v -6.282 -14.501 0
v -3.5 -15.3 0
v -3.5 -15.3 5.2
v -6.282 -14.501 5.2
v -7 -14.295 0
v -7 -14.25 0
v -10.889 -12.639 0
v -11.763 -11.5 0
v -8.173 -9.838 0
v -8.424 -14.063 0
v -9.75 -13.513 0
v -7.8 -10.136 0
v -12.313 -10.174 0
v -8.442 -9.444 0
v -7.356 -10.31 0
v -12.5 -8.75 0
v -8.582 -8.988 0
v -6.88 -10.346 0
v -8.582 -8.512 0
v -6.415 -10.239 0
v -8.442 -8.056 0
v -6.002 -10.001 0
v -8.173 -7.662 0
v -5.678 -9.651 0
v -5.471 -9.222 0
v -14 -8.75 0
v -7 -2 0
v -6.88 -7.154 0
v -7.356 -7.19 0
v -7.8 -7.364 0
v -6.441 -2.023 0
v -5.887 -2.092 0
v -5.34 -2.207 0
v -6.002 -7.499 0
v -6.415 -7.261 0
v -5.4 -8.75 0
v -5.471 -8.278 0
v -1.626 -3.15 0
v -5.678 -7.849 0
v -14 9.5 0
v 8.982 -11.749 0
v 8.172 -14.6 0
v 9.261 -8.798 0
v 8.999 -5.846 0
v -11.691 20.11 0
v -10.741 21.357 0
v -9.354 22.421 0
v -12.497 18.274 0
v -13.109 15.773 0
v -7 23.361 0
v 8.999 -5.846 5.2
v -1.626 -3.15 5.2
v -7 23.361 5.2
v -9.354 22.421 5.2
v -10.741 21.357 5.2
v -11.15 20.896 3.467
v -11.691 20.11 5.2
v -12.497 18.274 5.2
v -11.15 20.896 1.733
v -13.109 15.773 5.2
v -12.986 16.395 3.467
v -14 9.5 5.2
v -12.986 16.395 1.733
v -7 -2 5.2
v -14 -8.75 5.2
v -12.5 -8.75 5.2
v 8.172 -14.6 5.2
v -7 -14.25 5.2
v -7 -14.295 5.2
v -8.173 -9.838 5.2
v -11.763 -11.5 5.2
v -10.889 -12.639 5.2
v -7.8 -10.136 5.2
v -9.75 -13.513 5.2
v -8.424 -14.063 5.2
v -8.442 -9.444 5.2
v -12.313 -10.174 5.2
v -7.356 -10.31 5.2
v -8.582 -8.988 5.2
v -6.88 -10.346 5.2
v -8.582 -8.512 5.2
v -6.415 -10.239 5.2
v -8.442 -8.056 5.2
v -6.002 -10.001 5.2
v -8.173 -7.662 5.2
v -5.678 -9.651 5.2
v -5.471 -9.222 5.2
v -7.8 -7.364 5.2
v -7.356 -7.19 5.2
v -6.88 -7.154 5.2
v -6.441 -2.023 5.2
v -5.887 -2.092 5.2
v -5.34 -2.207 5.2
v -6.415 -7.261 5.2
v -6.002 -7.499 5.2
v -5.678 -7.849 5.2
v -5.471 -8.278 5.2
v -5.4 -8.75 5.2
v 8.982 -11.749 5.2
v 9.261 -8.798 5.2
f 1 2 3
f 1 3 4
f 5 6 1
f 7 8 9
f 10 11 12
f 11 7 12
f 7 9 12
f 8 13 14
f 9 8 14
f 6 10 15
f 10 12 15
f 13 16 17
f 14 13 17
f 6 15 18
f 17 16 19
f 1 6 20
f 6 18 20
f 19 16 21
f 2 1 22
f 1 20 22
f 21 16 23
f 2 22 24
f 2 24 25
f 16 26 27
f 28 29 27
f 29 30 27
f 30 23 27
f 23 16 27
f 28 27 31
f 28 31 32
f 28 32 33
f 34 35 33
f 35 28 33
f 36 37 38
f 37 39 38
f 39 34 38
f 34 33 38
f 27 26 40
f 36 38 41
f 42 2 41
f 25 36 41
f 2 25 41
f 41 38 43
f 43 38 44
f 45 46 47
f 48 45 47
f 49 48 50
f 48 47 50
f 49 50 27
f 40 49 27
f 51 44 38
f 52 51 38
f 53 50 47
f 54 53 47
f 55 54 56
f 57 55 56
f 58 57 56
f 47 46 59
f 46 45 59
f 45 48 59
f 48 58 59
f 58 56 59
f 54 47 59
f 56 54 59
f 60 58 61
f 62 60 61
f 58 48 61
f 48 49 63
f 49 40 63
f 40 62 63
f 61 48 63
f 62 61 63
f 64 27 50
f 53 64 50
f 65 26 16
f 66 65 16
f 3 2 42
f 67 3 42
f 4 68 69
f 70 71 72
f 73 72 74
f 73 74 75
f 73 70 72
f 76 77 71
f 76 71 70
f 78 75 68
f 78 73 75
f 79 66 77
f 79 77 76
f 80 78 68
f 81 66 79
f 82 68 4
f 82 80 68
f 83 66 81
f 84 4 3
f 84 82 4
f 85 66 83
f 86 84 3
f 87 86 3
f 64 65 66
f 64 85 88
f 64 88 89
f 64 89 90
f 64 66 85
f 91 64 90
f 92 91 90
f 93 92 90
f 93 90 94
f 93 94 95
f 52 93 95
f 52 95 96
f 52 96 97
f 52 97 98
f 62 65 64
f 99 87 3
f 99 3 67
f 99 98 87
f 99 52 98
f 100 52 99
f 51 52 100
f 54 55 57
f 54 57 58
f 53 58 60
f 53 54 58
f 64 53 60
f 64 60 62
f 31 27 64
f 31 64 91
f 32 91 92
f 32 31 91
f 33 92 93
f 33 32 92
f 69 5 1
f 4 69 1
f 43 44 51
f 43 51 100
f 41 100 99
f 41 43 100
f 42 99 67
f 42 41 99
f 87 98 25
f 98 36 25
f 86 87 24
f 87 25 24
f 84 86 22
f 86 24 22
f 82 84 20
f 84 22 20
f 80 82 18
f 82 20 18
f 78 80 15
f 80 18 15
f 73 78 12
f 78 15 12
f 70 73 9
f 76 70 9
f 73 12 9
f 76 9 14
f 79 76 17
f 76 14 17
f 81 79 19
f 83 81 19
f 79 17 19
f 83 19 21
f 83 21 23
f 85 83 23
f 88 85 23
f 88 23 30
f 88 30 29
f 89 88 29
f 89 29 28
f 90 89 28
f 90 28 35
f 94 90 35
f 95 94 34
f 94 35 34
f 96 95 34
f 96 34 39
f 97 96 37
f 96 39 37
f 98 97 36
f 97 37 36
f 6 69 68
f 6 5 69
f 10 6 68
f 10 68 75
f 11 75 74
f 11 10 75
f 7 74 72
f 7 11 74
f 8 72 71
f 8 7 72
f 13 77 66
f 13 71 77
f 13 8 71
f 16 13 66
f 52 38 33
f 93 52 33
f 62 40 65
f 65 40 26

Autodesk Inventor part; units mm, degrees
ref_plane "YZ Plane" through (0, 0, 0) normal (1, 0, 0) x (0, 1, 0)
ref_plane "XZ Plane" through (0, 0, 0) normal (0, 1, 0) x (-1, 0, 0)
ref_plane "XY Plane" through (0, 0, 0) normal (0, 0, 1) x (1, 0, 0)
sketch "Эскиз1" plane through (0, 0, 0) normal (0, 0, 1) x (1, 0, 0)
  circle A0 centre (-7, -17) radius 1.5 projected
  line L0 (14, -14.4) -> (14, -5) projected
  arc A1 (14, -5) -> (11, -2) centre (11, -5) ccw projected
  line L1 (11, -2) -> (-7, -2) projected
  line L2 (-7, -2) -> (-7, 15) projected
  line L3 (-14, 9.5) -> (-14, -8.75) projected
  line L4 (-7, -24) -> (7, -24) projected
  arc A2 (7, -24) -> (13.4992, -14.4) centre (7, -17) ccw projected
  line L5 (13.4992, -14.4) -> (14, -14.4) projected
  circle A3 centre (7, -17) radius 2.5 projected
  circle A4 centre (-7, -8.75) radius 5.5 projected
  circle A5 centre (-7, -8.75) radius 6.75 projected
  circle A6 centre (-7, -8.75) radius 5.5 projected
  circle A7 centre (-7, -8.75) radius 16.2607 projected
  circle A8 centre (-7, -8.75) radius 6.75 projected
  circle A9 centre (-7, -8.75) radius 5.5 projected
  arc A10 (46.8183, -61.5099) -> (48.485, -59.5378) centre (46.485, -59.5378) ccw projected
  line L6 (48.485, -59.5378) -> (48.485, -18) projected
  arc A11 (51.485, -15) -> (48.485, -18) centre (51.485, -18) ccw projected
  line L7 (51.485, -15) -> (51.97, -15) projected
  arc A12 (51.97, -15) -> (54.97, -12) centre (51.97, -12) ccw projected
  line L8 (54.97, -5) -> (54.97, -12) projected
  arc A13 (54.97, -5) -> (51.97, -2) centre (51.97, -5) ccw projected
  line L9 (-0.3729, -2) -> (51.97, -2) projected
  arc A14 (-0.3729, -2) -> (-11.03, -11.2398) centre (-0.1714, -12.9982) ccw projected
  line L10 (-11.03, -11.2398) -> (-11.03, -20.501) projected
  arc A15 (-11.03, -20.501) -> (-9.8871, -23.3004) centre (-7.03, -20.501) ccw projected
  arc A16 (-9.03, -25.4) -> (-9.8871, -23.3004) centre (-12.03, -25.4) ccw projected
  line L11 (-9.03, -25.4) -> (-9.03, -104.6) projected
  arc A17 (-9.8871, -106.6996) -> (-9.03, -104.6) centre (-12.03, -104.6) ccw projected
  arc A18 (-9.8871, -106.6996) -> (-11.03, -109.499) centre (-7.03, -109.499) ccw projected
  line L12 (-11.03, -109.499) -> (-11.03, -118.7602) projected
  arc A19 (-11.03, -118.7602) -> (-0.3729, -128) centre (-0.1714, -117.0018) ccw projected
  line L13 (51.97, -128) -> (-0.3729, -128) projected
  arc A20 (51.97, -128) -> (54.97, -125) centre (51.97, -125) ccw projected
  line L14 (54.97, -118) -> (54.97, -125) projected
  arc A21 (54.97, -118) -> (51.97, -115) centre (51.97, -118) ccw projected
  line L15 (51.97, -115) -> (51.485, -115) projected
  arc A22 (48.485, -112) -> (51.485, -115) centre (51.485, -112) ccw projected
  line L16 (48.485, -112) -> (48.485, -80.5022) projected
  arc A23 (48.485, -80.5022) -> (46.8183, -78.5301) centre (46.485, -80.5022) ccw projected
  arc A24 (43.485, -77.3303) -> (46.8183, -78.5301) centre (48.485, -68.67) ccw projected
  arc A25 (42.485, -75.5982) -> (43.485, -77.3303) centre (44.485, -75.5982) ccw projected
  line L17 (42.485, -75.5982) -> (42.485, -64.4418) projected
  arc A26 (43.485, -62.7097) -> (42.485, -64.4418) centre (44.485, -64.4418) ccw projected
  arc A27 (46.8183, -61.5099) -> (43.485, -62.7097) centre (48.485, -71.37) ccw projected
  circle A28 centre (-7, -113) radius 1.5 projected
  circle A29 centre (-7, -17) radius 1.5 projected
  circle A30 centre (48.485, -121.515) radius 1.5 projected
  circle A31 centre (7, -83) radius 1.5 projected
  circle A32 centre (7, -47) radius 1.5 projected
  circle A33 centre (48.485, -8.485) radius 1.5 projected
  circle A34 centre (39.485, -9.27) radius 0.325 projected
  circle A35 centre (38.885, -57.77) radius 0.8 projected
  circle A36 centre (39.385, -64.52) radius 0.5 projected
  circle A37 centre (-5.73, -68.27) radius 0.325 projected
  circle A38 centre (18.2, -105.38) radius 0.325 projected
  circle A39 centre (2.77, -17) radius 0.325 projected
  circle A40 centre (45.185, -81.79) radius 0.325 projected
  circle A41 centre (45.185, -36.51) radius 0.325 projected
  circle A42 centre (2.77, -10) radius 0.325 projected
  circle A43 centre (2.77, -120) radius 0.325 projected
  circle A44 centre (-5.73, -55.42) radius 0.325 projected
  circle A45 centre (29.385, -72.52) radius 0.85 projected
  circle A46 centre (43.885, -57.77) radius 0.8 projected
  circle A47 centre (-1.23, -120) radius 0.325 projected
  circle A48 centre (29.385, -67.52) radius 0.85 projected
  circle A49 centre (18.2, -92.76) radius 0.325 projected
  circle A50 centre (-5.73, -79) radius 0.325 projected
  circle A51 centre (35.215, -122) radius 0.325 projected
  circle A52 centre (33.485, -7.27) radius 0.5 projected
  circle A53 centre (45.185, -101.03) radius 0.325 projected
  circle A54 centre (45.185, -16.27) radius 0.325 projected
  circle A55 centre (35.215, -115) radius 0.325 projected
  circle A56 centre (2.77, -113) radius 0.325 projected
  circle A57 centre (-5.73, -40.84) radius 0.325 projected
  circle A58 centre (39.385, -75.52) radius 0.5 projected
  circle A59 centre (-1.23, -10) radius 0.325 projected
  arc A60 (46.8183, -61.5099) -> (48.485, -59.5378) centre (46.485, -59.5378) ccw projected
  line L18 (48.485, -59.5378) -> (48.485, -18) projected
  arc A61 (51.485, -15) -> (48.485, -18) centre (51.485, -18) ccw projected
  line L19 (51.485, -15) -> (51.97, -15) projected
  arc A62 (51.97, -15) -> (54.97, -12) centre (51.97, -12) ccw projected
  line L20 (54.97, -5) -> (54.97, -12) projected
  arc A63 (54.97, -5) -> (51.97, -2) centre (51.97, -5) ccw projected
  line L21 (-0.3729, -2) -> (51.97, -2) projected
  arc A64 (-0.3729, -2) -> (-11.03, -11.2398) centre (-0.1714, -12.9982) ccw projected
  line L22 (-11.03, -11.2398) -> (-11.03, -20.501) projected
  arc A65 (-11.03, -20.501) -> (-9.8871, -23.3004) centre (-7.03, -20.501) ccw projected
  arc A66 (-9.03, -25.4) -> (-9.8871, -23.3004) centre (-12.03, -25.4) ccw projected
  line L23 (-9.03, -25.4) -> (-9.03, -104.6) projected
  arc A67 (-9.8871, -106.6996) -> (-9.03, -104.6) centre (-12.03, -104.6) ccw projected
  arc A68 (-9.8871, -106.6996) -> (-11.03, -109.499) centre (-7.03, -109.499) ccw projected
  line L24 (-11.03, -109.499) -> (-11.03, -118.7602) projected
  arc A69 (-11.03, -118.7602) -> (-0.3729, -128) centre (-0.1714, -117.0018) ccw projected
  line L25 (51.97, -128) -> (-0.3729, -128) projected
  arc A70 (51.97, -128) -> (54.97, -125) centre (51.97, -125) ccw projected
  line L26 (54.97, -118) -> (54.97, -125) projected
  arc A71 (54.97, -118) -> (51.97, -115) centre (51.97, -118) ccw projected
  line L27 (51.97, -115) -> (51.485, -115) projected
  arc A72 (48.485, -112) -> (51.485, -115) centre (51.485, -112) ccw projected
  line L28 (48.485, -112) -> (48.485, -80.5022) projected
  arc A73 (48.485, -80.5022) -> (46.8183, -78.5301) centre (46.485, -80.5022) ccw projected
  arc A74 (43.485, -77.3303) -> (46.8183, -78.5301) centre (48.485, -68.67) ccw projected
  arc A75 (42.485, -75.5982) -> (43.485, -77.3303) centre (44.485, -75.5982) ccw projected
  line L29 (42.485, -75.5982) -> (42.485, -64.4418) projected
  arc A76 (43.485, -62.7097) -> (42.485, -64.4418) centre (44.485, -64.4418) ccw projected
  arc A77 (46.8183, -61.5099) -> (43.485, -62.7097) centre (48.485, -71.37) ccw projected
  circle A78 centre (-7, -113) radius 1.5 projected
  circle A79 centre (-7, -17) radius 1.5 projected
  circle A80 centre (48.485, -121.515) radius 1.5 projected
  circle A81 centre (7, -83) radius 1.5 projected
  circle A82 centre (7, -47) radius 1.5 projected
  circle A83 centre (48.485, -8.485) radius 1.5 projected
  circle A84 centre (39.485, -9.27) radius 0.325 projected
  circle A85 centre (38.885, -57.77) radius 0.8 projected
  circle A86 centre (39.385, -64.52) radius 0.5 projected
  circle A87 centre (-5.73, -68.27) radius 0.325 projected
  circle A88 centre (18.2, -105.38) radius 0.325 projected
  circle A89 centre (2.77, -17) radius 0.325 projected
  circle A90 centre (45.185, -81.79) radius 0.325 projected
  circle A91 centre (45.185, -36.51) radius 0.325 projected
  circle A92 centre (2.77, -10) radius 0.325 projected
  circle A93 centre (2.77, -120) radius 0.325 projected
  circle A94 centre (-5.73, -55.42) radius 0.325 projected
  circle A95 centre (29.385, -72.52) radius 0.85 projected
  circle A96 centre (43.885, -57.77) radius 0.8 projected
  circle A97 centre (-1.23, -120) radius 0.325 projected
  circle A98 centre (29.385, -67.52) radius 0.85 projected
  circle A99 centre (18.2, -92.76) radius 0.325 projected
  circle A100 centre (-5.73, -79) radius 0.325 projected
  circle A101 centre (35.215, -122) radius 0.325 projected
  circle A102 centre (33.485, -7.27) radius 0.5 projected
  circle A103 centre (45.185, -101.03) radius 0.325 projected
  circle A104 centre (45.185, -16.27) radius 0.325 projected
  circle A105 centre (35.215, -115) radius 0.325 projected
  circle A106 centre (2.77, -113) radius 0.325 projected
  circle A107 centre (-5.73, -40.84) radius 0.325 projected
  circle A108 centre (39.385, -75.52) radius 0.5 projected
  circle A109 centre (-1.23, -10) radius 0.325 projected
  circle A110 centre (-7, -17) radius 1.5 projected
  circle A111 centre (7, -17) radius 2.5 projected
  circle A112 centre (-7, -8.75) radius 16.2607 projected
  arc A113 (46.8183, -61.5099) -> (48.485, -59.5378) centre (46.485, -59.5378) ccw projected
  line L30 (48.485, -59.5378) -> (48.485, -18) projected
  arc A114 (51.485, -15) -> (48.485, -18) centre (51.485, -18) ccw projected
  line L31 (51.485, -15) -> (51.97, -15) projected
  arc A115 (51.97, -15) -> (54.97, -12) centre (51.97, -12) ccw projected
  line L32 (54.97, -5) -> (54.97, -12) projected
  arc A116 (54.97, -5) -> (51.97, -2) centre (51.97, -5) ccw projected
  line L33 (-0.3729, -2) -> (51.97, -2) projected
  arc A117 (-0.3729, -2) -> (-11.03, -11.2398) centre (-0.1714, -12.9982) ccw projected
  line L34 (-11.03, -11.2398) -> (-11.03, -20.501) projected
  arc A118 (-11.03, -20.501) -> (-9.8871, -23.3004) centre (-7.03, -20.501) ccw projected
  arc A119 (-9.03, -25.4) -> (-9.8871, -23.3004) centre (-12.03, -25.4) ccw projected
  line L35 (-9.03, -25.4) -> (-9.03, -104.6) projected
  arc A120 (-9.8871, -106.6996) -> (-9.03, -104.6) centre (-12.03, -104.6) ccw projected
  arc A121 (-9.8871, -106.6996) -> (-11.03, -109.499) centre (-7.03, -109.499) ccw projected
  line L36 (-11.03, -109.499) -> (-11.03, -118.7602) projected
  arc A122 (-11.03, -118.7602) -> (-0.3729, -128) centre (-0.1714, -117.0018) ccw projected
  line L37 (51.97, -128) -> (-0.3729, -128) projected
  arc A123 (51.97, -128) -> (54.97, -125) centre (51.97, -125) ccw projected
  line L38 (54.97, -118) -> (54.97, -125) projected
  arc A124 (54.97, -118) -> (51.97, -115) centre (51.97, -118) ccw projected
  line L39 (51.97, -115) -> (51.485, -115) projected
  arc A125 (48.485, -112) -> (51.485, -115) centre (51.485, -112) ccw projected
  line L40 (48.485, -112) -> (48.485, -80.5022) projected
  arc A126 (48.485, -80.5022) -> (46.8183, -78.5301) centre (46.485, -80.5022) ccw projected
  arc A127 (43.485, -77.3303) -> (46.8183, -78.5301) centre (48.485, -68.67) ccw projected
  arc A128 (42.485, -75.5982) -> (43.485, -77.3303) centre (44.485, -75.5982) ccw projected
  line L41 (42.485, -75.5982) -> (42.485, -64.4418) projected
  arc A129 (43.485, -62.7097) -> (42.485, -64.4418) centre (44.485, -64.4418) ccw projected
  arc A130 (46.8183, -61.5099) -> (43.485, -62.7097) centre (48.485, -71.37) ccw projected
  circle A131 centre (-7, -113) radius 1.5 projected
  circle A132 centre (-7, -17) radius 1.5 projected
  circle A133 centre (48.485, -121.515) radius 1.5 projected
  circle A134 centre (7, -83) radius 1.5 projected
  circle A135 centre (7, -47) radius 1.5 projected
  circle A136 centre (48.485, -8.485) radius 1.5 projected
  circle A137 centre (39.485, -9.27) radius 0.325 projected
  circle A138 centre (38.885, -57.77) radius 0.8 projected
  circle A139 centre (39.385, -64.52) radius 0.5 projected
  circle A140 centre (-5.73, -68.27) radius 0.325 projected
  circle A141 centre (18.2, -105.38) radius 0.325 projected
  circle A142 centre (2.77, -17) radius 0.325 projected
  circle A143 centre (45.185, -81.79) radius 0.325 projected
  circle A144 centre (45.185, -36.51) radius 0.325 projected
  circle A145 centre (2.77, -10) radius 0.325 projected
  circle A146 centre (2.77, -120) radius 0.325 projected
  circle A147 centre (-5.73, -55.42) radius 0.325 projected
  circle A148 centre (29.385, -72.52) radius 0.85 projected
  circle A149 centre (43.885, -57.77) radius 0.8 projected
  circle A150 centre (-1.23, -120) radius 0.325 projected
  circle A151 centre (29.385, -67.52) radius 0.85 projected
  circle A152 centre (18.2, -92.76) radius 0.325 projected
  circle A153 centre (-5.73, -79) radius 0.325 projected
  circle A154 centre (35.215, -122) radius 0.325 projected
  circle A155 centre (33.485, -7.27) radius 0.5 projected
  circle A156 centre (45.185, -101.03) radius 0.325 projected
  circle A157 centre (45.185, -16.27) radius 0.325 projected
  circle A158 centre (35.215, -115) radius 0.325 projected
  circle A159 centre (2.77, -113) radius 0.325 projected
  circle A160 centre (-5.73, -40.84) radius 0.325 projected
  circle A161 centre (39.385, -75.52) radius 0.5 projected
  circle A162 centre (-1.23, -10) radius 0.325 projected
  line L42 (-3.5, -15.3) -> (8.172, -14.6) projected
  line L43 (-1.9964, -14.2379) -> (9.1448, -10.6884) projected
  line L44 (7.4875, -11.5) -> (-3.5, -15.5) projected
  line L45 (-3.5, -15.3) -> (8.172, -14.6) projected
  line L46 (8.172, -14.8) -> (-3.5, -15.5) projected
  arc A163 (8.1929, -15.5) -> (7.4875, -11.5) centre (-3.5, -15.5) ccw projected
  line L47 (-3.5, -15.5) -> (9.3, -15.5) projected
  line L48 (-3.5, -15.5) -> (9.3, -15.5) projected
  circle A164 centre (-7, -17) radius 1.5 projected
  line L49 (14, -14.4) -> (14, -5) projected
  arc A165 (14, -5) -> (11, -2) centre (11, -5) ccw projected
  line L50 (11, -2) -> (-7, -2) projected
  line L51 (-7, -2) -> (-7, 15) projected
  line L52 (-14, 9.5) -> (-14, -8.75) projected
  line L53 (-7, -24) -> (7, -24) projected
  arc A166 (7, -24) -> (13.4992, -14.4) centre (7, -17) ccw projected
  line L54 (13.4992, -14.4) -> (14, -14.4) projected
  circle A167 centre (7, -17) radius 2.5 projected
  circle A168 centre (-7, -17) radius 1.5 projected
  line L55 (14, -14.4) -> (14, -5) projected
  arc A169 (14, -5) -> (11, -2) centre (11, -5) ccw projected
  line L56 (11, -2) -> (-7, -2) projected
  line L57 (-7, -2) -> (-7, 15) projected
  line L58 (-14, 9.5) -> (-14, -8.75) projected
  line L59 (-7, -24) -> (7, -24) projected
  arc A170 (7, -24) -> (13.4992, -14.4) centre (7, -17) ccw projected
  line L60 (13.4992, -14.4) -> (14, -14.4) projected
  circle A171 centre (7, -17) radius 2.5 projected
  line L61 (-3.5, -25.6) -> (-3.5, -15.5) projected
  line L62 (-3.5, -25.6) -> (-3.5, -15.5) projected
  line L63 (-3.5, -15.3) -> (-6.2824, -14.501) projected
  circle A172 centre (-7, -17) radius 2.6 projected
  line L64 (-3.5, -15.5) -> (-7, -15.5) projected
  circle A173 centre (-7, -17) radius 1.5 projected
  line L65 (14, -14.4) -> (14, -5) projected
  arc A174 (14, -5) -> (11, -2) centre (11, -5) ccw projected
  line L66 (11, -2) -> (-7, -2) projected
  line L67 (-7, -2) -> (-7, 15) projected
  line L68 (-14, 9.5) -> (-14, -8.75) projected
  line L69 (-7, -24) -> (7, -24) projected
  arc A175 (7, -24) -> (13.4992, -14.4) centre (7, -17) ccw projected
  line L70 (13.4992, -14.4) -> (14, -14.4) projected
  circle A176 centre (7, -17) radius 2.5 projected
  circle A177 centre (-7, -17) radius 1.5 projected
  circle A178 centre (-7, -17) radius 2.6 projected
  circle A179 centre (-7, -8.75) radius 5.5 projected
  line L71 (-1.9964, -14.2379) -> (-4.8898, -14.1478) projected
  line L72 (-1.9964, -14.2379) -> (9.1448, -10.6884) projected
  line L73 (-1.9964, -14.2379) -> (9.1448, -10.6884) projected
  circle A180 centre (-7, -8.75) radius 6.75 projected
  line L74 (-5.8077, -14.1192) -> (-4.8898, -14.1478) projected
  line L75 (-5.8077, -14.1192) -> (-4.8898, -14.1478) projected
  circle A181 centre (-7, -8.75) radius 5.5 projected
  line L76 (-7, -15.5) -> (-7, -2) projected
  line L77 (-7.1651, -14.2475) -> (-6.2824, -14.501) projected
  line L78 (-3.5, -15.3) -> (-6.2824, -14.501) projected
  circle A182 centre (-7, -17) radius 1.5 projected
  line L79 (14, -14.4) -> (14, -5) projected
  arc A183 (14, -5) -> (11, -2) centre (11, -5) ccw projected
  line L80 (11, -2) -> (-7, -2) projected
  line L81 (-7, -2) -> (-7, 15) projected
  line L82 (-14, 9.5) -> (-14, -8.75) projected
  line L83 (-7, -24) -> (7, -24) projected
  arc A184 (7, -24) -> (13.4992, -14.4) centre (7, -17) ccw projected
  line L84 (13.4992, -14.4) -> (14, -14.4) projected
  circle A185 centre (7, -17) radius 2.5 projected
  circle A186 centre (-7, -17) radius 2.6 projected
  circle A187 centre (-7, -17) radius 2.6 projected
  line L85 (-7, -15.5) -> (-7, -2) projected
  circle A188 centre (-7, -17) radius 1.5 projected
  line L86 (14, -14.4) -> (14, -5) projected
  arc A189 (14, -5) -> (11, -2) centre (11, -5) ccw projected
  line L87 (11, -2) -> (-7, -2) projected
  line L88 (-7, -2) -> (-7, 15) projected
  line L89 (-14, 9.5) -> (-14, -8.75) projected
  line L90 (-7, -24) -> (7, -24) projected
  arc A190 (7, -24) -> (13.4992, -14.4) centre (7, -17) ccw projected
  line L91 (13.4992, -14.4) -> (14, -14.4) projected
  circle A191 centre (7, -17) radius 2.5 projected
  circle A192 centre (-7, -17) radius 1.5 projected
  line L92 (14, -14.4) -> (14, -5) projected
  arc A193 (14, -5) -> (11, -2) centre (11, -5) ccw projected
  line L93 (11, -2) -> (-7, -2) projected
  line L94 (-7, -2) -> (-7, 15) projected
  line L95 (-14, 9.5) -> (-14, -8.75) projected
  line L96 (-7, -24) -> (7, -24) projected
  arc A194 (7, -24) -> (13.4992, -14.4) centre (7, -17) ccw projected
  line L97 (13.4992, -14.4) -> (14, -14.4) projected
  circle A195 centre (7, -17) radius 2.5 projected
  circle A196 centre (-7, -8.75) radius 5.5 projected
  circle A197 centre (-7, -17) radius 1.5 projected
  line L98 (14, -14.4) -> (14, -5) projected
  arc A198 (14, -5) -> (11, -2) centre (11, -5) ccw projected
  line L99 (11, -2) -> (-7, -2) projected
  line L100 (-7, -2) -> (-7, 15) projected
  line L101 (-14, 9.5) -> (-14, -8.75) projected
  line L102 (-7, -24) -> (7, -24) projected
  arc A199 (7, -24) -> (13.4992, -14.4) centre (7, -17) ccw projected
  line L103 (13.4992, -14.4) -> (14, -14.4) projected
  circle A200 centre (7, -17) radius 2.5 projected
  circle A201 centre (-7, -8.75) radius 1.6 projected
  circle A202 centre (-7, -8.75) radius 1.6 projected
  line L104 (-7, -15.5) -> (-7, -2) projected
  circle A203 centre (-7, -17) radius 1.5 projected
  line L105 (14, -14.4) -> (14, -5) projected
  arc A204 (14, -5) -> (11, -2) centre (11, -5) ccw projected
  line L106 (11, -2) -> (-7, -2) projected
  line L107 (-7, -2) -> (-7, 15) projected
  line L108 (-14, 9.5) -> (-14, -8.75) projected
  line L109 (-7, -24) -> (7, -24) projected
  arc A205 (7, -24) -> (13.4992, -14.4) centre (7, -17) ccw projected
  line L110 (13.4992, -14.4) -> (14, -14.4) projected
  circle A206 centre (7, -17) radius 2.5 projected
  circle A207 centre (-7, -17) radius 1.5 projected
  line L111 (14, -14.4) -> (14, -5) projected
  arc A208 (14, -5) -> (11, -2) centre (11, -5) ccw projected
  line L112 (11, -2) -> (-7, -2) projected
  line L113 (-7, -2) -> (-7, 15) projected
  line L114 (-14, 9.5) -> (-14, -8.75) projected
  line L115 (-7, -24) -> (7, -24) projected
  arc A209 (7, -24) -> (13.4992, -14.4) centre (7, -17) ccw projected
  line L116 (13.4992, -14.4) -> (14, -14.4) projected
  circle A210 centre (7, -17) radius 2.5 projected
  line L117 (-7, -8.75) -> (8.9993, -5.8462) projected
  circle A211 centre (-7, -17) radius 1.5 projected
  line L118 (14, -14.4) -> (14, -5) projected
  arc A212 (14, -5) -> (11, -2) centre (11, -5) ccw projected
  line L119 (11, -2) -> (-7, -2) projected
  line L120 (-7, -2) -> (-7, 15) projected
  line L121 (-14, 9.5) -> (-14, -8.75) projected
  line L122 (-7, -24) -> (7, -24) projected
  arc A213 (7, -24) -> (13.4992, -14.4) centre (7, -17) ccw projected
  line L123 (13.4992, -14.4) -> (14, -14.4) projected
  circle A214 centre (7, -17) radius 2.5 projected
  line L124 (7.7935, -2) -> (-7, -8.75) projected
  line L125 (7.7935, -2) -> (-7, -8.75) projected
  circle A215 centre (-7, -17) radius 1.5 projected
  line L126 (14, -14.4) -> (14, -5) projected
  arc A216 (14, -5) -> (11, -2) centre (11, -5) ccw projected
  line L127 (11, -2) -> (-7, -2) projected
  line L128 (-7, -2) -> (-7, 15) projected
  line L129 (-14, 9.5) -> (-14, -8.75) projected
  line L130 (-7, -24) -> (7, -24) projected
  arc A217 (7, -24) -> (13.4992, -14.4) centre (7, -17) ccw projected
  line L131 (13.4992, -14.4) -> (14, -14.4) projected
  circle A218 centre (7, -17) radius 2.5 projected
  circle A219 centre (-7, -8.75) radius 6.75 projected
  circle A220 centre (-7, -17) radius 1.5 projected
  line L132 (14, -14.4) -> (14, -5) projected
  arc A221 (14, -5) -> (11, -2) centre (11, -5) ccw projected
  line L133 (11, -2) -> (-7, -2) projected
  line L134 (-7, -2) -> (-7, 15) projected
  line L135 (-14, 9.5) -> (-14, -8.75) projected
  line L136 (-7, -24) -> (7, -24) projected
  arc A222 (7, -24) -> (13.4992, -14.4) centre (7, -17) ccw projected
  line L137 (13.4992, -14.4) -> (14, -14.4) projected
  circle A223 centre (7, -17) radius 2.5 projected
  circle A224 centre (-7, -8.75) radius 6.75 projected
  circle A225 centre (-7, -17) radius 2.6 projected
  circle A226 centre (-7, -17) radius 2.6 projected
  circle A227 centre (-7, -17) radius 1.5 projected
  line L138 (14, -14.4) -> (14, -5) projected
  arc A228 (14, -5) -> (11, -2) centre (11, -5) ccw projected
  line L139 (11, -2) -> (-7, -2) projected
  line L140 (-7, -2) -> (-7, 15) projected
  line L141 (-14, 9.5) -> (-14, -8.75) projected
  line L142 (-7, -24) -> (7, -24) projected
  arc A229 (7, -24) -> (13.4992, -14.4) centre (7, -17) ccw projected
  line L143 (13.4992, -14.4) -> (14, -14.4) projected
  circle A230 centre (7, -17) radius 2.5 projected
  line L144 (8.9993, -5.8462) -> (-1.6265, -3.1497) projected
  line L145 (8.9993, -5.8462) -> (-1.6265, -3.1497) projected
  circle A231 centre (-7, -17) radius 1.5 projected
  line L146 (14, -14.4) -> (14, -5) projected
  arc A232 (14, -5) -> (11, -2) centre (11, -5) ccw projected
  line L147 (11, -2) -> (-7, -2) projected
  line L148 (-7, -2) -> (-7, 15) projected
  line L149 (-14, 9.5) -> (-14, -8.75) projected
  line L150 (-7, -24) -> (7, -24) projected
  arc A233 (7, -24) -> (13.4992, -14.4) centre (7, -17) ccw projected
  line L151 (13.4992, -14.4) -> (14, -14.4) projected
  circle A234 centre (7, -17) radius 2.5 projected
  circle A235 centre (-7, -17) radius 1.5 projected
  line L152 (14, -14.4) -> (14, -5) projected
  arc A236 (14, -5) -> (11, -2) centre (11, -5) ccw projected
  line L153 (11, -2) -> (-7, -2) projected
  line L154 (-7, -2) -> (-7, 15) projected
  line L155 (-14, 9.5) -> (-14, -8.75) projected
  line L156 (-7, -24) -> (7, -24) projected
  arc A237 (7, -24) -> (13.4992, -14.4) centre (7, -17) ccw projected
  line L157 (13.4992, -14.4) -> (14, -14.4) projected
  circle A238 centre (7, -17) radius 2.5 projected
  circle A239 centre (-7, -17) radius 1.5 projected
  line L158 (14, -14.4) -> (14, -5) projected
  arc A240 (14, -5) -> (11, -2) centre (11, -5) ccw projected
  line L159 (11, -2) -> (-7, -2) projected
  line L160 (-7, -2) -> (-7, 15) projected
  line L161 (-14, 9.5) -> (-14, -8.75) projected
  line L162 (-7, -24) -> (7, -24) projected
  arc A241 (7, -24) -> (13.4992, -14.4) centre (7, -17) ccw projected
  line L163 (13.4992, -14.4) -> (14, -14.4) projected
  circle A242 centre (7, -17) radius 2.5 projected
  circle A243 centre (-7, -8.75) radius 6.75 projected
  line L164 (11, -2) -> (-7, -2) projected
  circle A244 centre (-7, -17) radius 1.5 projected
  line L165 (14, -14.4) -> (14, -5) projected
  arc A245 (14, -5) -> (11, -2) centre (11, -5) ccw projected
  line L166 (11, -2) -> (-7, -2) projected
  line L167 (-7, -2) -> (-7, 15) projected
  line L168 (-14, 9.5) -> (-14, -8.75) projected
  line L169 (-7, -24) -> (7, -24) projected
  arc A246 (7, -24) -> (13.4992, -14.4) centre (7, -17) ccw projected
  line L170 (13.4992, -14.4) -> (14, -14.4) projected
  circle A247 centre (7, -17) radius 2.5 projected
  line L171 (-7, 15) -> (-7, 23.3611) projected
  line L172 (8.9993, -5.8462) -> (-1.6265, -3.1497) projected
  line L173 (8.9993, -5.8462) -> (-6.1569, -2) projected
  line L174 (8.9993, -5.8462) -> (-1.6265, -3.1497) projected
  line L175 (8.9993, -5.8462) -> (-6.1569, -2) projected
  line L176 (-14, -8.75) -> (-14, -3.75)
  line L177 (-14, -8.75) -> (-12.5, -8.75)
  spline S0 degree 3 poles (-7, 23.3611) (-12.8051, 21.7936) (-12.8999, 17.7118) (-14, 9.5) knots -0.659309 -0.659309 -0.659309 -0.659309 0 0 0 0 projected
  line L178 (-14, -8.75) -> (-12.7, -8.75) projected
  arc A248 (-12.7, -8.75) -> (-11.9767, -11.529) centre (-7, -8.75) ccw projected
  line L179 (-11.9767, -11.529) -> (-9.4156, -17.9617) projected
  arc A249 (-9.4156, -17.9617) -> (-7, -19.6) centre (-7, -17) ccw projected
  arc A250 (-7, -24) -> (-7, -19.6) centre (-7, -21.8) ccw projected
  line L180 (-7, 15) -> (-7, 23.3611) projected
  spline S1 degree 3 poles (-7, 23.3611) (-12.8051, 21.7936) (-12.8999, 17.7118) (-14, 9.5) knots -0.659309 -0.659309 -0.659309 -0.659309 0 0 0 0 projected
  line L181 (-14, -8.75) -> (-12.7, -8.75) projected
  arc A251 (-12.7, -8.75) -> (-11.9767, -11.529) centre (-7, -8.75) ccw projected
  line L182 (-11.9767, -11.529) -> (-9.4156, -17.9617) projected
  arc A252 (-9.4156, -17.9617) -> (-7, -19.6) centre (-7, -17) ccw projected
  arc A253 (-7, -24) -> (-7, -19.6) centre (-7, -21.8) ccw projected
  line L183 (-7, 15) -> (-7, 23.3611) projected
  spline S2 degree 3 poles (-7, 23.3611) (-12.8051, 21.7936) (-12.8999, 17.7118) (-14, 9.5) knots -0.659309 -0.659309 -0.659309 -0.659309 0 0 0 0 projected
  line L184 (-14, -8.75) -> (-12.7, -8.75) projected
  arc A254 (-12.7, -8.75) -> (-11.9767, -11.529) centre (-7, -8.75) ccw projected
  line L185 (-11.9767, -11.529) -> (-9.4156, -17.9617) projected
  arc A255 (-9.4156, -17.9617) -> (-7, -19.6) centre (-7, -17) ccw projected
  arc A256 (-7, -24) -> (-7, -19.6) centre (-7, -21.8) ccw projected
  line L186 (-7, 15) -> (-7, 23.3611) projected
  spline S3 degree 3 poles (-7, 23.3611) (-12.8051, 21.7936) (-12.8999, 17.7118) (-14, 9.5) knots -0.659309 -0.659309 -0.659309 -0.659309 0 0 0 0 projected
  line L187 (-14, -8.75) -> (-12.7, -8.75) projected
  arc A257 (-12.7, -8.75) -> (-11.9767, -11.529) centre (-7, -8.75) ccw projected
  line L188 (-11.9767, -11.529) -> (-9.4156, -17.9617) projected
  arc A258 (-9.4156, -17.9617) -> (-7, -19.6) centre (-7, -17) ccw projected
  arc A259 (-7, -24) -> (-7, -19.6) centre (-7, -21.8) ccw projected
  line L189 (-7, 15) -> (-7, 23.3611) projected
  spline S4 degree 3 poles (-7, 23.3611) (-12.8051, 21.7936) (-12.8999, 17.7118) (-14, 9.5) knots -0.659309 -0.659309 -0.659309 -0.659309 0 0 0 0 projected
  line L190 (-14, -8.75) -> (-12.7, -8.75) projected
  arc A260 (-12.7, -8.75) -> (-11.9767, -11.529) centre (-7, -8.75) ccw projected
  line L191 (-11.9767, -11.529) -> (-9.4156, -17.9617) projected
  arc A261 (-9.4156, -17.9617) -> (-7, -19.6) centre (-7, -17) ccw projected
  arc A262 (-7, -24) -> (-7, -19.6) centre (-7, -21.8) ccw projected
  line L192 (-7, 15) -> (-7, 23.3611) projected
  spline S5 degree 3 poles (-7, 23.3611) (-12.8051, 21.7936) (-12.8999, 17.7118) (-14, 9.5) knots -0.659309 -0.659309 -0.659309 -0.659309 0 0 0 0 projected
  line L193 (-14, -8.75) -> (-12.7, -8.75) projected
  arc A263 (-12.7, -8.75) -> (-11.9767, -11.529) centre (-7, -8.75) ccw projected
  line L194 (-11.9767, -11.529) -> (-9.4156, -17.9617) projected
  arc A264 (-9.4156, -17.9617) -> (-7, -19.6) centre (-7, -17) ccw projected
  arc A265 (-7, -24) -> (-7, -19.6) centre (-7, -21.8) ccw projected
  line L195 (-7, 15) -> (-7, 23.3611) projected
  spline S6 degree 3 poles (-7, 23.3611) (-12.8051, 21.7936) (-12.8999, 17.7118) (-14, 9.5) knots -0.659309 -0.659309 -0.659309 -0.659309 0 0 0 0 projected
  line L196 (-14, -8.75) -> (-12.7, -8.75) projected
  arc A266 (-12.7, -8.75) -> (-11.9767, -11.529) centre (-7, -8.75) ccw projected
  line L197 (-11.9767, -11.529) -> (-9.4156, -17.9617) projected
  arc A267 (-9.4156, -17.9617) -> (-7, -19.6) centre (-7, -17) ccw projected
  arc A268 (-7, -24) -> (-7, -19.6) centre (-7, -21.8) ccw projected
  line L198 (-7, 15) -> (-7, 23.3611) projected
  spline S7 degree 3 poles (-7, 23.3611) (-12.8051, 21.7936) (-12.8999, 17.7118) (-14, 9.5) knots -0.659309 -0.659309 -0.659309 -0.659309 0 0 0 0 projected
  line L199 (-14, -8.75) -> (-12.7, -8.75) projected
  arc A269 (-12.7, -8.75) -> (-11.9767, -11.529) centre (-7, -8.75) ccw projected
  line L200 (-11.9767, -11.529) -> (-9.4156, -17.9617) projected
  arc A270 (-9.4156, -17.9617) -> (-7, -19.6) centre (-7, -17) ccw projected
  arc A271 (-7, -24) -> (-7, -19.6) centre (-7, -21.8) ccw projected
  line L201 (-7, 15) -> (-7, 23.3611) projected
  spline S8 degree 3 poles (-7, 23.3611) (-12.8051, 21.7936) (-12.8999, 17.7118) (-14, 9.5) knots -0.659309 -0.659309 -0.659309 -0.659309 0 0 0 0 projected
  line L202 (-14, -8.75) -> (-12.7, -8.75) projected
  arc A272 (-12.7, -8.75) -> (-11.9767, -11.529) centre (-7, -8.75) ccw projected
  line L203 (-11.9767, -11.529) -> (-9.4156, -17.9617) projected
  arc A273 (-9.4156, -17.9617) -> (-7, -19.6) centre (-7, -17) ccw projected
  arc A274 (-7, -24) -> (-7, -19.6) centre (-7, -21.8) ccw projected
  line L204 (-7, 15) -> (-7, 23.3611) projected
  spline S9 degree 3 poles (-7, 23.3611) (-12.8051, 21.7936) (-12.8999, 17.7118) (-14, 9.5) knots -0.659309 -0.659309 -0.659309 -0.659309 0 0 0 0 projected
  line L205 (-14, -8.75) -> (-12.7, -8.75) projected
  arc A275 (-12.7, -8.75) -> (-11.9767, -11.529) centre (-7, -8.75) ccw projected
  line L206 (-11.9767, -11.529) -> (-9.4156, -17.9617) projected
  arc A276 (-9.4156, -17.9617) -> (-7, -19.6) centre (-7, -17) ccw projected
  arc A277 (-7, -24) -> (-7, -19.6) centre (-7, -21.8) ccw projected
  line L207 (-7, 15) -> (-7, 23.3611) projected
  spline S10 degree 3 poles (-7, 23.3611) (-12.8051, 21.7936) (-12.8999, 17.7118) (-14, 9.5) knots -0.659309 -0.659309 -0.659309 -0.659309 0 0 0 0 projected
  line L208 (-14, -8.75) -> (-12.7, -8.75) projected
  arc A278 (-12.7, -8.75) -> (-11.9767, -11.529) centre (-7, -8.75) ccw projected
  line L209 (-11.9767, -11.529) -> (-9.4156, -17.9617) projected
  arc A279 (-9.4156, -17.9617) -> (-7, -19.6) centre (-7, -17) ccw projected
  arc A280 (-7, -24) -> (-7, -19.6) centre (-7, -21.8) ccw projected
  line L210 (-7, 15) -> (-7, 23.3611) projected
  spline S11 degree 3 poles (-7, 23.3611) (-12.8051, 21.7936) (-12.8999, 17.7118) (-14, 9.5) knots -0.659309 -0.659309 -0.659309 -0.659309 0 0 0 0 projected
  line L211 (-14, -8.75) -> (-12.7, -8.75) projected
  arc A281 (-12.7, -8.75) -> (-11.9767, -11.529) centre (-7, -8.75) ccw projected
  line L212 (-11.9767, -11.529) -> (-9.4156, -17.9617) projected
  arc A282 (-9.4156, -17.9617) -> (-7, -19.6) centre (-7, -17) ccw projected
  arc A283 (-7, -24) -> (-7, -19.6) centre (-7, -21.8) ccw projected
  line L213 (-7, 15) -> (-7, 23.3611) projected
  spline S12 degree 3 poles (-7, 23.3611) (-12.8051, 21.7936) (-12.8999, 17.7118) (-14, 9.5) knots -0.659309 -0.659309 -0.659309 -0.659309 0 0 0 0 projected
  line L214 (-14, -8.75) -> (-12.7, -8.75) projected
  arc A284 (-12.7, -8.75) -> (-11.9767, -11.529) centre (-7, -8.75) ccw projected
  line L215 (-11.9767, -11.529) -> (-9.4156, -17.9617) projected
  arc A285 (-9.4156, -17.9617) -> (-7, -19.6) centre (-7, -17) ccw projected
  arc A286 (-7, -24) -> (-7, -19.6) centre (-7, -21.8) ccw projected
  line L216 (-7, 15) -> (-7, 23.3611) projected
  spline S13 degree 3 poles (-7, 23.3611) (-12.8051, 21.7936) (-12.8999, 17.7118) (-14, 9.5) knots -0.659309 -0.659309 -0.659309 -0.659309 0 0 0 0 projected
  line L217 (-14, -8.75) -> (-12.7, -8.75) projected
  arc A287 (-12.7, -8.75) -> (-11.9767, -11.529) centre (-7, -8.75) ccw projected
  line L218 (-11.9767, -11.529) -> (-9.4156, -17.9617) projected
  arc A288 (-9.4156, -17.9617) -> (-7, -19.6) centre (-7, -17) ccw projected
  arc A289 (-7, -24) -> (-7, -19.6) centre (-7, -21.8) ccw projected
  line L219 (-7, 15) -> (-7, 23.3611) projected
  spline S14 degree 3 poles (-7, 23.3611) (-12.8051, 21.7936) (-12.8999, 17.7118) (-14, 9.5) knots -0.659309 -0.659309 -0.659309 -0.659309 0 0 0 0 projected
  line L220 (-14, -8.75) -> (-12.7, -8.75) projected
  arc A290 (-12.7, -8.75) -> (-11.9767, -11.529) centre (-7, -8.75) ccw projected
  line L221 (-11.9767, -11.529) -> (-9.4156, -17.9617) projected
  arc A291 (-9.4156, -17.9617) -> (-7, -19.6) centre (-7, -17) ccw projected
  arc A292 (-7, -24) -> (-7, -19.6) centre (-7, -21.8) ccw projected
  line L222 (-7, 15) -> (-7, 23.3611) projected
  spline S15 degree 3 poles (-7, 23.3611) (-12.8051, 21.7936) (-12.8999, 17.7118) (-14, 9.5) knots -0.659309 -0.659309 -0.659309 -0.659309 0 0 0 0 projected
  line L223 (-14, -8.75) -> (-12.7, -8.75) projected
  arc A293 (-12.7, -8.75) -> (-11.9767, -11.529) centre (-7, -8.75) ccw projected
  line L224 (-11.9767, -11.529) -> (-9.4156, -17.9617) projected
  arc A294 (-9.4156, -17.9617) -> (-7, -19.6) centre (-7, -17) ccw projected
  arc A295 (-7, -24) -> (-7, -19.6) centre (-7, -21.8) ccw projected
  line L225 (-7, 15) -> (-7, 23.3611) projected
  spline S16 degree 3 poles (-7, 23.3611) (-12.8051, 21.7936) (-12.8999, 17.7118) (-14, 9.5) knots -0.659309 -0.659309 -0.659309 -0.659309 0 0 0 0 projected
  line L226 (-14, -8.75) -> (-12.7, -8.75) projected
  arc A296 (-12.7, -8.75) -> (-11.9767, -11.529) centre (-7, -8.75) ccw projected
  line L227 (-11.9767, -11.529) -> (-9.4156, -17.9617) projected
  arc A297 (-9.4156, -17.9617) -> (-7, -19.6) centre (-7, -17) ccw projected
  arc A298 (-7, -24) -> (-7, -19.6) centre (-7, -21.8) ccw projected
  line L228 (-7, 15) -> (-7, 23.3611) projected
  spline S17 degree 3 poles (-7, 23.3611) (-12.8051, 21.7936) (-12.8999, 17.7118) (-14, 9.5) knots -0.659309 -0.659309 -0.659309 -0.659309 0 0 0 0 projected
  line L229 (-14, -8.75) -> (-12.7, -8.75) projected
  arc A299 (-12.7, -8.75) -> (-11.9767, -11.529) centre (-7, -8.75) ccw projected
  line L230 (-11.9767, -11.529) -> (-9.4156, -17.9617) projected
  arc A300 (-9.4156, -17.9617) -> (-7, -19.6) centre (-7, -17) ccw projected
  arc A301 (-7, -24) -> (-7, -19.6) centre (-7, -21.8) ccw projected
  line L231 (-7, 15) -> (-7, 23.3611) projected
  point P0 (0, 0)
  point P1 (-4, 18)
  point P2 (2, 24)
  point P3 (-2.9442, 24)
  point P4 (-14, -17)
  point P5 (-5.5, -17)
  point P6 (-5.3397, -2.2074)
  point P7 (-7, -14.2949)
  point P8 (-7, -14.25)
  dimension "d0" = 5
extrude "Выдавливание1" add sketch "Эскиз1" along normal blind 5.2 contours L63 L77 L76 A4 L74 L71 A5 | A5 L71 L43 A7 L42 A163 L44 L63 | L71 L74 A4 L117 A5 | A5 L117 A7 L43 L71 | L44 A163 L42 A3 | L76 A201 L117 A4 | A4 L10 A14 L76 A201 | L177 L3 A7 L2 A5 | A5 L76 A4 L177 | A4 L76 A14 L10 | A3 L42 | A5 A14 A4 L76 | L117 A4 L124 A5 | A5 L124 L144 L117 | L76 A14 A4 L124 A201 | A7 L3 S0 L171 L2 | L173 A14 A5 | A4 A14 L76 | L124 A4 A14 A5 | A5 A14 L173 L144 L124 | L117 A201 L124 A4 | A42 | A59
properties part number "end_cap"
